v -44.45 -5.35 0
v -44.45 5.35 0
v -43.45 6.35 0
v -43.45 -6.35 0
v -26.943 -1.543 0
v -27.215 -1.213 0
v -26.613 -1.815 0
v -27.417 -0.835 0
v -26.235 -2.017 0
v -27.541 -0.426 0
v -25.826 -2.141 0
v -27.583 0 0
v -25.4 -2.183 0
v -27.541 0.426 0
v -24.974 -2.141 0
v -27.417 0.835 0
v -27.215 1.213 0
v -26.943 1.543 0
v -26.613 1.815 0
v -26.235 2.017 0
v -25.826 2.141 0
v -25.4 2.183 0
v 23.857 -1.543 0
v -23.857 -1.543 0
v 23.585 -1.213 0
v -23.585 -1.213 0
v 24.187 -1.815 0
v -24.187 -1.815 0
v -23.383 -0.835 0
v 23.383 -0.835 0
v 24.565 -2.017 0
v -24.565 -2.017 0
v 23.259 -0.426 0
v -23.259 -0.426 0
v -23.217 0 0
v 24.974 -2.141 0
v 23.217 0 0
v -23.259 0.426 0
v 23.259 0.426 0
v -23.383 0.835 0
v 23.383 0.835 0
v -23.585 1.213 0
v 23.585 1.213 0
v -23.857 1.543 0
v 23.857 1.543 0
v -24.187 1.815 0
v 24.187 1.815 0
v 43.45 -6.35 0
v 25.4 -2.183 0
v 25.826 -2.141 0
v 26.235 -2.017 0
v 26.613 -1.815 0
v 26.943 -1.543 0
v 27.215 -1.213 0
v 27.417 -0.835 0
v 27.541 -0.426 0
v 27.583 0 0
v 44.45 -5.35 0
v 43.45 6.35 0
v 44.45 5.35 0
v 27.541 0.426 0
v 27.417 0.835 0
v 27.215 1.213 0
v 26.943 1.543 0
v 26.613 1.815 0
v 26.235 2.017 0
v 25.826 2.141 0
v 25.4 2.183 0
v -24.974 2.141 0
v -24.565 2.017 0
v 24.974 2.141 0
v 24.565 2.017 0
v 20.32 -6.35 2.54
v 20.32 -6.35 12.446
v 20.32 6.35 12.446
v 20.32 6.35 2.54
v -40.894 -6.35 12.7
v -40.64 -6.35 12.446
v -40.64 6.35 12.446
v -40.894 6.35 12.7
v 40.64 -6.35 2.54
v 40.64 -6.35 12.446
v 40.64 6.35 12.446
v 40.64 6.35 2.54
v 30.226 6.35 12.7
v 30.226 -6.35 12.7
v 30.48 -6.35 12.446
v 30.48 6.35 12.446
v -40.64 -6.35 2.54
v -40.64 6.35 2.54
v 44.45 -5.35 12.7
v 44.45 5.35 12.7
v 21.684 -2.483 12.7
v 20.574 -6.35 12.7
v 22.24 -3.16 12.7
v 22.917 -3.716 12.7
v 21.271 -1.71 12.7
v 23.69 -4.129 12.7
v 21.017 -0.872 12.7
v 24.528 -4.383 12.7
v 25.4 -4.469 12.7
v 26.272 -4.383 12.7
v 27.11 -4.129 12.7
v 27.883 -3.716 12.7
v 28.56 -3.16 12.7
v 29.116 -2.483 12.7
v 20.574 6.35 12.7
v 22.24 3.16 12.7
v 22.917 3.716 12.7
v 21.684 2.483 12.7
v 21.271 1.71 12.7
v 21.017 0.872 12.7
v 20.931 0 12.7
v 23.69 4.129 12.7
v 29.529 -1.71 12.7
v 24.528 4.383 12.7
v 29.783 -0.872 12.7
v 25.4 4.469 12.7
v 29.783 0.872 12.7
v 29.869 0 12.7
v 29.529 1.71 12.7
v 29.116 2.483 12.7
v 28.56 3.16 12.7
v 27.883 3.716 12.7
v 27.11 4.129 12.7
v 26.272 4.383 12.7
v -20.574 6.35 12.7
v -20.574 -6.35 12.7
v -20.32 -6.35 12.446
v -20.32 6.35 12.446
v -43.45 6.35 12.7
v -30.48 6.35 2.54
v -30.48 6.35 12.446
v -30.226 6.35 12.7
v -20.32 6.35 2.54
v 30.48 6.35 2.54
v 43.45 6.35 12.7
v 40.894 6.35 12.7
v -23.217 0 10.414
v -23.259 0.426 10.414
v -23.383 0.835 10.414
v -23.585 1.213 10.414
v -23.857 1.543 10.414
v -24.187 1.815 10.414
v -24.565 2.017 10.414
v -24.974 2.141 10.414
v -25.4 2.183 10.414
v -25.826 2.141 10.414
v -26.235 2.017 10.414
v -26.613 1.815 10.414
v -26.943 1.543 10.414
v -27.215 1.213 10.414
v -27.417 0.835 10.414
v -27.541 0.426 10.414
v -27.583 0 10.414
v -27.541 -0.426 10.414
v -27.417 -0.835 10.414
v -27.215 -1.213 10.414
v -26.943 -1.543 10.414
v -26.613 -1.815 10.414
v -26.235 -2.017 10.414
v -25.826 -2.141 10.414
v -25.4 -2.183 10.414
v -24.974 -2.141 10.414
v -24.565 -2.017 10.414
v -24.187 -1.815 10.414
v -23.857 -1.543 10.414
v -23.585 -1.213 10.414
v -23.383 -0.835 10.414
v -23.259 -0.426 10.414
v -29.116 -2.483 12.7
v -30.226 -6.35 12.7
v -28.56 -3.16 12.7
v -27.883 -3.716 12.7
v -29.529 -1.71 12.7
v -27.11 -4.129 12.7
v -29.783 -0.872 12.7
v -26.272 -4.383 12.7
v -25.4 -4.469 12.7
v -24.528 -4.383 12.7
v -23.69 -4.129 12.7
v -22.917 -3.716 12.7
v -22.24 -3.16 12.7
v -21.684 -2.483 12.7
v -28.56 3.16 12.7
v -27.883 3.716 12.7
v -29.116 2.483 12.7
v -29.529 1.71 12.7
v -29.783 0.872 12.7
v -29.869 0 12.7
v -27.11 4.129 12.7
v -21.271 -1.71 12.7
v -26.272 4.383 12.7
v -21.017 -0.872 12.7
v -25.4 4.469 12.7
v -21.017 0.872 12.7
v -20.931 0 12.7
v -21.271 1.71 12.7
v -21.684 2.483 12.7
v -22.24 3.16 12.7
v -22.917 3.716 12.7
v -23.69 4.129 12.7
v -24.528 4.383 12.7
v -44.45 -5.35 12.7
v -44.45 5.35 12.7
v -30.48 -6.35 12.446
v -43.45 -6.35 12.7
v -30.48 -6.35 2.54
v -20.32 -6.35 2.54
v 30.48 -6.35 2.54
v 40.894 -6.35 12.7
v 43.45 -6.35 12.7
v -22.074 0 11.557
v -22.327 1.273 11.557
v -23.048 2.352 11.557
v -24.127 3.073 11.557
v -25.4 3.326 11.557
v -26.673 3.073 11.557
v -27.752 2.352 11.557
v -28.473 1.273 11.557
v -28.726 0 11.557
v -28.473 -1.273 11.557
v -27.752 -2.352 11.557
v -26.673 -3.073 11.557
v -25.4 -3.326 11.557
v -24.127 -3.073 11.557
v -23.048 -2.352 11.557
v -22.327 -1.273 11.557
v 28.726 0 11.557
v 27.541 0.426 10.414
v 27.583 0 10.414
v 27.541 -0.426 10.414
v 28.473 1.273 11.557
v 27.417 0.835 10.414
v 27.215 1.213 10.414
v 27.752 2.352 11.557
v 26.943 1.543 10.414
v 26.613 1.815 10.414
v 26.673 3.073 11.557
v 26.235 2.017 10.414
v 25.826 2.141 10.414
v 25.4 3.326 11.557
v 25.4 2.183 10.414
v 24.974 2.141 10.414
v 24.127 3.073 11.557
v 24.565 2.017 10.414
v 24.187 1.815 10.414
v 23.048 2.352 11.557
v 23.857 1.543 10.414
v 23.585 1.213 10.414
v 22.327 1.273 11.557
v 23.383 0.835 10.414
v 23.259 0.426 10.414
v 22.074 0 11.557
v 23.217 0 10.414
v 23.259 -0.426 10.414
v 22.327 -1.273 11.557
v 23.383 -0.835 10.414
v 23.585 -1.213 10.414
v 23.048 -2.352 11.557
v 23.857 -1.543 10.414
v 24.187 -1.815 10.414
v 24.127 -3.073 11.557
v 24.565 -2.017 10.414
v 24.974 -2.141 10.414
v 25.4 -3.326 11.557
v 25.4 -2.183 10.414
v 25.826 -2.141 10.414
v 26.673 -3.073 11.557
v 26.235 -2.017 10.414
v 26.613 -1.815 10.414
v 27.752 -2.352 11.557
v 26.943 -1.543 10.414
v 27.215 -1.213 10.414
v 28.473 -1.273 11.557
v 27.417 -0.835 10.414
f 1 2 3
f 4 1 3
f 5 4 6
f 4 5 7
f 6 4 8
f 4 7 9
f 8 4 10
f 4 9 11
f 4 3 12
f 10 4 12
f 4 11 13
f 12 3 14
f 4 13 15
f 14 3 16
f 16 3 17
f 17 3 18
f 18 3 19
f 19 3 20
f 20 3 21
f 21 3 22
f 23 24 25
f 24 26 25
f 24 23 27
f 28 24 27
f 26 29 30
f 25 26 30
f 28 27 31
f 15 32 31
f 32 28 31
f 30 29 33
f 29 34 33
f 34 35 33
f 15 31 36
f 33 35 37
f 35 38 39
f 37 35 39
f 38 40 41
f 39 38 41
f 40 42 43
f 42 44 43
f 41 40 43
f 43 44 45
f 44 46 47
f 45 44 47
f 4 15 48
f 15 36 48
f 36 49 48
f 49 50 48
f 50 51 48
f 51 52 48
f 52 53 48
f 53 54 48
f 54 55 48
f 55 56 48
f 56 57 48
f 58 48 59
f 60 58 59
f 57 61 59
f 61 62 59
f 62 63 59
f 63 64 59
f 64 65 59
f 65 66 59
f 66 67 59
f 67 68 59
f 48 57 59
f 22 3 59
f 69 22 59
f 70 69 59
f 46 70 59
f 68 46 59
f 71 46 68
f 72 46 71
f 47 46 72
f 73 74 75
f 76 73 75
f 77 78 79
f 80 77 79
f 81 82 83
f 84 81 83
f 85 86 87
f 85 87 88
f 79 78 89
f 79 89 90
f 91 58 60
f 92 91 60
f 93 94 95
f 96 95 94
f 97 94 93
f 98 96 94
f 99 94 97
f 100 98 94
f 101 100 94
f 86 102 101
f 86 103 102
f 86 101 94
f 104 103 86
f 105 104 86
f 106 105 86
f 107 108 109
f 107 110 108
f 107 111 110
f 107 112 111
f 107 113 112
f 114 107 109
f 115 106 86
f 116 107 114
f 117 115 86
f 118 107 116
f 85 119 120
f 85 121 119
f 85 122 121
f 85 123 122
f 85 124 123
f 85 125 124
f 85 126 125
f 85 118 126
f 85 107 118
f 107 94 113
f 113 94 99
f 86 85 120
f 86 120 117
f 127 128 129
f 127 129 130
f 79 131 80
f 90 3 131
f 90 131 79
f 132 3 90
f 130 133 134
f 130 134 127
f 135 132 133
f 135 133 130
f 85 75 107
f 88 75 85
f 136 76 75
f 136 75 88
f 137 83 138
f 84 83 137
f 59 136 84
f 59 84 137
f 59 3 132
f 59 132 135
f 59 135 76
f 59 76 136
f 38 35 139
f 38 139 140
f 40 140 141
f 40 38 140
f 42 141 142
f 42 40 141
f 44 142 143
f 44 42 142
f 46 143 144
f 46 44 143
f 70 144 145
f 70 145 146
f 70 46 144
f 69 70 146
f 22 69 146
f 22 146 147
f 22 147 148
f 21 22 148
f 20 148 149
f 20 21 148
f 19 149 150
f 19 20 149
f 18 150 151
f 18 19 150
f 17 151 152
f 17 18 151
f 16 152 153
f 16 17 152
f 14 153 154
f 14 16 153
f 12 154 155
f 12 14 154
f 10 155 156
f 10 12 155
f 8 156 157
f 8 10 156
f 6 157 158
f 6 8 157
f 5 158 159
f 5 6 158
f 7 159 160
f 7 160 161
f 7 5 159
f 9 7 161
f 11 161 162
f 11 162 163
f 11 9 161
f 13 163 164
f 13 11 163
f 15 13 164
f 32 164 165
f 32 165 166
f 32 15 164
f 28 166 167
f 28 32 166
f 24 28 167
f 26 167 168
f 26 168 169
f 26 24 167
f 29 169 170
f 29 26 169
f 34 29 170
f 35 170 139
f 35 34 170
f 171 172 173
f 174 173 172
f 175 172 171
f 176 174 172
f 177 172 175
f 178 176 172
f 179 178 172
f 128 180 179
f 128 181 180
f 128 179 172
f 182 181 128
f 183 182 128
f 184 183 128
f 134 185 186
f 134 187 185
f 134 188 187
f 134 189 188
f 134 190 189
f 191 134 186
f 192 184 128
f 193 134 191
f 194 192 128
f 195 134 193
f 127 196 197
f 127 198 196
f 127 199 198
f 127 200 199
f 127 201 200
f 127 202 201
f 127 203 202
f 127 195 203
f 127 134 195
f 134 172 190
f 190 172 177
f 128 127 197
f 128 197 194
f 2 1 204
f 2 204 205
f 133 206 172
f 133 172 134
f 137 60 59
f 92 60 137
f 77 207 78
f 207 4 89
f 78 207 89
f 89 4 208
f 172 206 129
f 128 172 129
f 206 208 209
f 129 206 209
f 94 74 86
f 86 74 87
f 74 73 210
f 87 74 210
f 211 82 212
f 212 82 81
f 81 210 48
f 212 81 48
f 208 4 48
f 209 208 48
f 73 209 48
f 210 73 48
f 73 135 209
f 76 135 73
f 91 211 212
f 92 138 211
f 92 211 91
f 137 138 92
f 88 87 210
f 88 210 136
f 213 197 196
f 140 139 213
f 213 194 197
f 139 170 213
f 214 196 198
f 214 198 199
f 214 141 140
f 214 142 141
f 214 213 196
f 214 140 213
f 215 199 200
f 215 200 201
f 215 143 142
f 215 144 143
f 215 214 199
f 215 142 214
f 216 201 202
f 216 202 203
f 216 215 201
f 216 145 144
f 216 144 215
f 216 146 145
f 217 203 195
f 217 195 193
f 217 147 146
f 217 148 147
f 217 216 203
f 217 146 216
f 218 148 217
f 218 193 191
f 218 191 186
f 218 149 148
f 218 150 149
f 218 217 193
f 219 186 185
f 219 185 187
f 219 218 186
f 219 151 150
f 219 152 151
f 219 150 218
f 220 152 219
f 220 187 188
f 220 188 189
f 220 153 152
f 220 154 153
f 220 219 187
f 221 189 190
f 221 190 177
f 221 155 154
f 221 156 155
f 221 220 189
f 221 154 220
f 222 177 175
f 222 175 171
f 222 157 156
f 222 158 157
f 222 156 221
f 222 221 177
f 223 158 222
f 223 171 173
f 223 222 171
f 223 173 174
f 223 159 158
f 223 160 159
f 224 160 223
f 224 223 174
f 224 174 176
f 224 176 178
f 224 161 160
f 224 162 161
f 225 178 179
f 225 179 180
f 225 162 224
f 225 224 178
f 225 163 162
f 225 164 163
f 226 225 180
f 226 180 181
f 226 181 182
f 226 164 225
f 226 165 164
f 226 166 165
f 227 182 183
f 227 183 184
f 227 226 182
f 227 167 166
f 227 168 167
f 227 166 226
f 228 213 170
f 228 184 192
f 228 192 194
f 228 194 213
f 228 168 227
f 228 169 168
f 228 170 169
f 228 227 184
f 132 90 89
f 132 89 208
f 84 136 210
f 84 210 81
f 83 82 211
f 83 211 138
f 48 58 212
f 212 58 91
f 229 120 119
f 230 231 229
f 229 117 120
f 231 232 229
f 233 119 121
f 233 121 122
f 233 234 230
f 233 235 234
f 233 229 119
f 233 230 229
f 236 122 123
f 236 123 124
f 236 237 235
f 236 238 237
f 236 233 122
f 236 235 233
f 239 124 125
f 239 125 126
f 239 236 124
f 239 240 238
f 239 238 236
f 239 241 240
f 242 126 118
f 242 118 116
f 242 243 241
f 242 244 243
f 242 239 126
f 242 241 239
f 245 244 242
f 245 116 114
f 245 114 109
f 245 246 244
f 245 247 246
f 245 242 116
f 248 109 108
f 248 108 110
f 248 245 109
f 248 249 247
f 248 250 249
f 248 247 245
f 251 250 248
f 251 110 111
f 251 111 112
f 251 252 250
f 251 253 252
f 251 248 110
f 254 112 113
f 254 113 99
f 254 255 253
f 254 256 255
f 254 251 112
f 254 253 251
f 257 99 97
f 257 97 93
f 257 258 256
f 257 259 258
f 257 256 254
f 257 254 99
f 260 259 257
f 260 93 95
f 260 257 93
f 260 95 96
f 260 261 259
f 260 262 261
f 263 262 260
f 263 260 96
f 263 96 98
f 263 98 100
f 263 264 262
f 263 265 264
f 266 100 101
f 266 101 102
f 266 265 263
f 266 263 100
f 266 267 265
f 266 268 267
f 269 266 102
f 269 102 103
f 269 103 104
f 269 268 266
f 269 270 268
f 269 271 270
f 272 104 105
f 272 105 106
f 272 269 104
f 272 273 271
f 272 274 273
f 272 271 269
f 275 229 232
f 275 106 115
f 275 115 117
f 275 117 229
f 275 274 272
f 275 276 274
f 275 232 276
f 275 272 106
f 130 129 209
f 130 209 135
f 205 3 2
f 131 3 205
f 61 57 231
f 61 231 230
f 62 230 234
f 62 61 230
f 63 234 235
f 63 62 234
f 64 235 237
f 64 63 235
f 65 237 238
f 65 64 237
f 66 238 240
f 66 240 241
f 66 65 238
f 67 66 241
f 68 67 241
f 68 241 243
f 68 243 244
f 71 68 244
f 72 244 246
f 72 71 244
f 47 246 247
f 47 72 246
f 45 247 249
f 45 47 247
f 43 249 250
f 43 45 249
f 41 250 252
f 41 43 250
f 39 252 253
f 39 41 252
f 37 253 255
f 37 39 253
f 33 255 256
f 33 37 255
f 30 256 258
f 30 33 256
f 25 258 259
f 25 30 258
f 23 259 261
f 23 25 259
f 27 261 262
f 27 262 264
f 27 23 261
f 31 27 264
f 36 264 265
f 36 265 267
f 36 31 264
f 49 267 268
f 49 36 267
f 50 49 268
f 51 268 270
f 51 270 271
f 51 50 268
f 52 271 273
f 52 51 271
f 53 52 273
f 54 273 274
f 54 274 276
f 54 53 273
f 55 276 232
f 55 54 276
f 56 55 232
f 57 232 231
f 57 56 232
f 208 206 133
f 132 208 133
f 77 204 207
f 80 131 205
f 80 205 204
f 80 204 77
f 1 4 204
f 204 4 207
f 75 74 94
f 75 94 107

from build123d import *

# Parameters (mm, degrees)
SKETCH_W        = 88.9
SKETCH_H        = 12.7
SKETCH_R        = 2.182812
PAD_DEPTH       = 12.7
CHAMFER_SIZE    = 1
CHAMFER001_SIZE = 2.286
SKETCH001_W     = 10.16
SKETCH001_H     = 12.7
SKETCH001_W_2   = 40.64
POCKET_DEPTH    = 10.16
CHAMFER002_SIZE = 0.254


with BuildPart() as part:
    # Sketch → Pad (new body)
    with BuildSketch(Plane.XY):
        Rectangle(SKETCH_W, SKETCH_H)
        with Locations((-25.4, 0)):
            Circle(SKETCH_R, mode=Mode.SUBTRACT)
        with Locations((25.4, 0)):
            Circle(SKETCH_R, mode=Mode.SUBTRACT)
    extrude(amount=PAD_DEPTH)

    # Chamfer
    chamfer_edges = [part.edges().sort_by_distance(p)[0] for p in [
        (44.45, 6.35, 6.35),
        (44.45, -6.35, 6.35),
        (-44.45, -6.35, 6.35),
        (-44.45, 6.35, 6.35),
    ]]
    chamfer(chamfer_edges, length=CHAMFER_SIZE)

    # Chamfer001
    chamfer001_edges = [part.edges().sort_by_distance(p)[0] for p in [
        (-27.582812, 0, 12.7),
        (23.217187, 0, 12.7),
    ]]
    chamfer(chamfer001_edges, length=CHAMFER001_SIZE)

    # Sketch001 → Pocket (cut)
    with BuildSketch(Plane.XY.offset(12.7)):
        with Locations((-35.56, 0)):
            Rectangle(SKETCH001_W, SKETCH001_H)
        with Locations((35.56, 0)):
            Rectangle(SKETCH001_W, SKETCH001_H)
        Rectangle(SKETCH001_W_2, SKETCH001_H)
    extrude(amount=-POCKET_DEPTH, mode=Mode.SUBTRACT)

    # Chamfer002
    chamfer002_edges = [part.edges().sort_by_distance(p)[0] for p in [
        (-40.64, 0, 12.7),
        (-30.48, 0, 12.7),
        (-20.32, 0, 12.7),
        (20.32, 0, 12.7),
        (30.48, 0, 12.7),
        (40.64, 0, 12.7),
    ]]
    chamfer(chamfer002_edges, length=CHAMFER002_SIZE)


solid = part.part
